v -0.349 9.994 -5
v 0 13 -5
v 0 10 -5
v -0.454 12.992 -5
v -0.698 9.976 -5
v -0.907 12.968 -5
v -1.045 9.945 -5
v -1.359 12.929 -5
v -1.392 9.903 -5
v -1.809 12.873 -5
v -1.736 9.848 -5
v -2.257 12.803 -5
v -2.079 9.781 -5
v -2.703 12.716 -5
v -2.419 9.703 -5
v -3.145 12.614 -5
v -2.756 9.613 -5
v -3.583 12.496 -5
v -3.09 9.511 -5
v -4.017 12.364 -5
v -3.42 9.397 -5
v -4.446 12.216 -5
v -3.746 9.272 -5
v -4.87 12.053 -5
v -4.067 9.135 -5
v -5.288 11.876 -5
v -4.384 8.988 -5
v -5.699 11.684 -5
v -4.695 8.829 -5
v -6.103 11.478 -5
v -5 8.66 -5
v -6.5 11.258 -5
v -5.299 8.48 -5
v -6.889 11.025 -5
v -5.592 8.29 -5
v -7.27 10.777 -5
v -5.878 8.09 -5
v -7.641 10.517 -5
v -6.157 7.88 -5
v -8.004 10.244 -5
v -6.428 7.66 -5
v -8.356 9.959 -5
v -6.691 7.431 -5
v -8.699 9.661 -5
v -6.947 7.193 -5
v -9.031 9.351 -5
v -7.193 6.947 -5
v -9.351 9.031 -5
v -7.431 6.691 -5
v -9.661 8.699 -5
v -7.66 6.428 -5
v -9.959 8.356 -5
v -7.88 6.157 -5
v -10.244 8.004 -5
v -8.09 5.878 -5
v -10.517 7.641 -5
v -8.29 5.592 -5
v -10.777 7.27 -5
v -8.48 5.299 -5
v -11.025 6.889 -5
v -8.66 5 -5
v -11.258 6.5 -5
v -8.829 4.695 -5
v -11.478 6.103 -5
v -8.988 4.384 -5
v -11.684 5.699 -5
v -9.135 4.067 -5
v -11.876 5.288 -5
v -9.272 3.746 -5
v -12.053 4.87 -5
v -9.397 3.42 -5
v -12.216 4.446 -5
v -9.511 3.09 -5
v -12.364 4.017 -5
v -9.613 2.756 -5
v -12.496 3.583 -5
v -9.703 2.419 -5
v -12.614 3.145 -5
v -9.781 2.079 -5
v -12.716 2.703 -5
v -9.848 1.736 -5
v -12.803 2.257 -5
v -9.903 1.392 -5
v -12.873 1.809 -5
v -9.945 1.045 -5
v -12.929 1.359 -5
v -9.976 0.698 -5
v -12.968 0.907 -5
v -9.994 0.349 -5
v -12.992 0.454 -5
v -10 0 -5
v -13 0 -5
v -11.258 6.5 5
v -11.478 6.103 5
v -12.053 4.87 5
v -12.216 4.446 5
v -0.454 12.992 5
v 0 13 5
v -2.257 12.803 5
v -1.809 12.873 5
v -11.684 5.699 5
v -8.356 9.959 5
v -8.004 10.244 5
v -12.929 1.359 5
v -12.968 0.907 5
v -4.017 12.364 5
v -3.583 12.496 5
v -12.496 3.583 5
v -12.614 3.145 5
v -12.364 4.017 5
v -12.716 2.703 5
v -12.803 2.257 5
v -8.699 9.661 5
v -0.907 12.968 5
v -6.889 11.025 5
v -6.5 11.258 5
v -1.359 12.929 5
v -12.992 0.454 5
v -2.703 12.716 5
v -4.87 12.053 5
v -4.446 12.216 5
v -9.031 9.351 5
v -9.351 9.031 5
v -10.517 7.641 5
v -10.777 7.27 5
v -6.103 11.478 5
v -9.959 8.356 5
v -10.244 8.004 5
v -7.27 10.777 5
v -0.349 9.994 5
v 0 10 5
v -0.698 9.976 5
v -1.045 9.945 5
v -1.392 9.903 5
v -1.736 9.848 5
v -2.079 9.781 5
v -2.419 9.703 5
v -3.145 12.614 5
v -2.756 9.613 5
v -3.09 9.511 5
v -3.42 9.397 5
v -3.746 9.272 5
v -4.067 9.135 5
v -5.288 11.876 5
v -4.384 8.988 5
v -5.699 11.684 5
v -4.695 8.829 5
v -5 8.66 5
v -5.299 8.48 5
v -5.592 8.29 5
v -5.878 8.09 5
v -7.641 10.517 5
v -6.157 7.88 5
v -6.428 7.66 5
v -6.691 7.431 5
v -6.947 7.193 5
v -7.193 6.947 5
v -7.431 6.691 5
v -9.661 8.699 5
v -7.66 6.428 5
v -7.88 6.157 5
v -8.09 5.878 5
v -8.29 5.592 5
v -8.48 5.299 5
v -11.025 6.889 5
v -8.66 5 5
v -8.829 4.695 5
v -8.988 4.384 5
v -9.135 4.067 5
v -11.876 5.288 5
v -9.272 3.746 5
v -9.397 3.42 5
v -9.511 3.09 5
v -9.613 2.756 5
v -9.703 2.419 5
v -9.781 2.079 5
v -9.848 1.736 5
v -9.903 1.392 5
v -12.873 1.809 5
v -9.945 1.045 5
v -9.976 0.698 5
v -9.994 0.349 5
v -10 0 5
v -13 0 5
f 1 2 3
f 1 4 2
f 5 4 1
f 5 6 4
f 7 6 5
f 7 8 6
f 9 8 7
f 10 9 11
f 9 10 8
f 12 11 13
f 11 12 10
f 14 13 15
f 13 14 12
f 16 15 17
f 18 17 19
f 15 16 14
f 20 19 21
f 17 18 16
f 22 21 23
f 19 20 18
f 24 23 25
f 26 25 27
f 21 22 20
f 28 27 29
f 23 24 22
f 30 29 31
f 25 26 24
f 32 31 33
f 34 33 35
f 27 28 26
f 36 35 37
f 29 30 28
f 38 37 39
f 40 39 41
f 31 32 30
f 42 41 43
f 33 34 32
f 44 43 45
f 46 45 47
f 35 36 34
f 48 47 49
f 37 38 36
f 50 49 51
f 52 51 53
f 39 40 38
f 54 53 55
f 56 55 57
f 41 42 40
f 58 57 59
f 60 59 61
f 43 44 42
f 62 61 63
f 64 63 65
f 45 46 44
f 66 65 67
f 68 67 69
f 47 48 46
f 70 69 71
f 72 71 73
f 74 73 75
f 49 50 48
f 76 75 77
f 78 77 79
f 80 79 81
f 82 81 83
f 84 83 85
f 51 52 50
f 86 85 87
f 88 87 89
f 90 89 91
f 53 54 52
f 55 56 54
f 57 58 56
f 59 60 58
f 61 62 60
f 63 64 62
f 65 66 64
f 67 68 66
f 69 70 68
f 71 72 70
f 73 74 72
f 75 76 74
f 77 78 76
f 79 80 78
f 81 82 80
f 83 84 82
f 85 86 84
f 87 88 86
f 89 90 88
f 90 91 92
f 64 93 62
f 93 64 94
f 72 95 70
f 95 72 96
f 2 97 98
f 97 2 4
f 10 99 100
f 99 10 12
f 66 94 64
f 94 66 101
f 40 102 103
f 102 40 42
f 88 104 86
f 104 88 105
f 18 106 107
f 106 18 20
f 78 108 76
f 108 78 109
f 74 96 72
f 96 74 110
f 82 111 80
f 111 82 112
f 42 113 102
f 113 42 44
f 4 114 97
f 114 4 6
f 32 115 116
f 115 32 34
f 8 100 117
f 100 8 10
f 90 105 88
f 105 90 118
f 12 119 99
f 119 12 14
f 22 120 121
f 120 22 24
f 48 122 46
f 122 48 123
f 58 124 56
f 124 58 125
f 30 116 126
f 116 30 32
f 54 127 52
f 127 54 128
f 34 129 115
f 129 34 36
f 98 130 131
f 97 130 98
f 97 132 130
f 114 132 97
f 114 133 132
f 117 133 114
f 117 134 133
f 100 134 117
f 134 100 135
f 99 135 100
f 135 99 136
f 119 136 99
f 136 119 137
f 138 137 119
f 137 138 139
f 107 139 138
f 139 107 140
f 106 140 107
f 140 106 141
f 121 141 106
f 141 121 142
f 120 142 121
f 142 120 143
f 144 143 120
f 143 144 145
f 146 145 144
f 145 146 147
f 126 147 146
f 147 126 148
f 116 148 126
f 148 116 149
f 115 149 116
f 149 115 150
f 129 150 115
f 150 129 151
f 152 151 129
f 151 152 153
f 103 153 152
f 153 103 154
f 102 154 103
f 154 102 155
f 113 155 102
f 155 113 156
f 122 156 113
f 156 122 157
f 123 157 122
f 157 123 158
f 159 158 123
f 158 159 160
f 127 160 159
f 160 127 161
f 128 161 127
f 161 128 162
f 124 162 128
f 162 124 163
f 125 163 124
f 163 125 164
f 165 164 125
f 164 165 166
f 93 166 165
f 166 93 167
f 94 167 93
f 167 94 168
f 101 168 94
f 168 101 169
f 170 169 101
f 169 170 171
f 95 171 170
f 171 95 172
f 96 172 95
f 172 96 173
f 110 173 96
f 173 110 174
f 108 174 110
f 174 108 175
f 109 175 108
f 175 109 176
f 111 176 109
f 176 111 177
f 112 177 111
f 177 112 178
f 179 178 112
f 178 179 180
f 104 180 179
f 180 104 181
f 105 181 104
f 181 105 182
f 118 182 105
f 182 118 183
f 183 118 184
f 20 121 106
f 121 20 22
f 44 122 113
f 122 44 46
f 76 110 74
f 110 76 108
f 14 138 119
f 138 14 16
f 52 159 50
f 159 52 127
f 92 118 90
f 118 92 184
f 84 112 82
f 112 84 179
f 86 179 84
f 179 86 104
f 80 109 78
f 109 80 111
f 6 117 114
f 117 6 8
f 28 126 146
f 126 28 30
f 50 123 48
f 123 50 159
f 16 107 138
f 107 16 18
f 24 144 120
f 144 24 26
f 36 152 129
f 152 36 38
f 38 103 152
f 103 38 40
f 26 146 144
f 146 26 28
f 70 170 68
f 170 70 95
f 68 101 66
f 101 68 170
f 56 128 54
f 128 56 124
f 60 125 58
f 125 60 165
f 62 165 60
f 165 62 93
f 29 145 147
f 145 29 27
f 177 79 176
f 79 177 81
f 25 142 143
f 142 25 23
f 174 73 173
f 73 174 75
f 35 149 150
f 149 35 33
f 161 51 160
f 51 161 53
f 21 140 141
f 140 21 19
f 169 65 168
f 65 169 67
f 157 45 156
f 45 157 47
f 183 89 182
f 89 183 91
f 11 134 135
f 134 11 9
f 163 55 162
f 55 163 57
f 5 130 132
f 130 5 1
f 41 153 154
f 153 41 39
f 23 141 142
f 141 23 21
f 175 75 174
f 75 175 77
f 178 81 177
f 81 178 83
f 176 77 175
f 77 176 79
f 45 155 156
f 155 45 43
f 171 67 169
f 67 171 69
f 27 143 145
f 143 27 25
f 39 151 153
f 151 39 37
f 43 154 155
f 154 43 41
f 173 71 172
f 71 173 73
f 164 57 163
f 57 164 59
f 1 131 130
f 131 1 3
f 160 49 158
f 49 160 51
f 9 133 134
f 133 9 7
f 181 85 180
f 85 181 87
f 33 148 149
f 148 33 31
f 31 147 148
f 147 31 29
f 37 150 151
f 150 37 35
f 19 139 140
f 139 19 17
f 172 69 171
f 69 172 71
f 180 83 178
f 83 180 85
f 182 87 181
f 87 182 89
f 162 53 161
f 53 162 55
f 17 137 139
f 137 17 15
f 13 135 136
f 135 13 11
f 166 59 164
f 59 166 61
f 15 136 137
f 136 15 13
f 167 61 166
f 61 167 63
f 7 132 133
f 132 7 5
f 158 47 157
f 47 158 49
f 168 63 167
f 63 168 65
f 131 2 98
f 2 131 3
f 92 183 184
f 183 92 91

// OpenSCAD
difference(){
cylinder(h=10, d=26, $fn = 180, center = true);
    
cylinder(h=11, d=20, $fn = 180, center = true); 
 
translate([14,0,0]) cube([28,28,12], center = true);

translate([0,-14,0]) cube([28,28,12], center = true);    
    
}    
